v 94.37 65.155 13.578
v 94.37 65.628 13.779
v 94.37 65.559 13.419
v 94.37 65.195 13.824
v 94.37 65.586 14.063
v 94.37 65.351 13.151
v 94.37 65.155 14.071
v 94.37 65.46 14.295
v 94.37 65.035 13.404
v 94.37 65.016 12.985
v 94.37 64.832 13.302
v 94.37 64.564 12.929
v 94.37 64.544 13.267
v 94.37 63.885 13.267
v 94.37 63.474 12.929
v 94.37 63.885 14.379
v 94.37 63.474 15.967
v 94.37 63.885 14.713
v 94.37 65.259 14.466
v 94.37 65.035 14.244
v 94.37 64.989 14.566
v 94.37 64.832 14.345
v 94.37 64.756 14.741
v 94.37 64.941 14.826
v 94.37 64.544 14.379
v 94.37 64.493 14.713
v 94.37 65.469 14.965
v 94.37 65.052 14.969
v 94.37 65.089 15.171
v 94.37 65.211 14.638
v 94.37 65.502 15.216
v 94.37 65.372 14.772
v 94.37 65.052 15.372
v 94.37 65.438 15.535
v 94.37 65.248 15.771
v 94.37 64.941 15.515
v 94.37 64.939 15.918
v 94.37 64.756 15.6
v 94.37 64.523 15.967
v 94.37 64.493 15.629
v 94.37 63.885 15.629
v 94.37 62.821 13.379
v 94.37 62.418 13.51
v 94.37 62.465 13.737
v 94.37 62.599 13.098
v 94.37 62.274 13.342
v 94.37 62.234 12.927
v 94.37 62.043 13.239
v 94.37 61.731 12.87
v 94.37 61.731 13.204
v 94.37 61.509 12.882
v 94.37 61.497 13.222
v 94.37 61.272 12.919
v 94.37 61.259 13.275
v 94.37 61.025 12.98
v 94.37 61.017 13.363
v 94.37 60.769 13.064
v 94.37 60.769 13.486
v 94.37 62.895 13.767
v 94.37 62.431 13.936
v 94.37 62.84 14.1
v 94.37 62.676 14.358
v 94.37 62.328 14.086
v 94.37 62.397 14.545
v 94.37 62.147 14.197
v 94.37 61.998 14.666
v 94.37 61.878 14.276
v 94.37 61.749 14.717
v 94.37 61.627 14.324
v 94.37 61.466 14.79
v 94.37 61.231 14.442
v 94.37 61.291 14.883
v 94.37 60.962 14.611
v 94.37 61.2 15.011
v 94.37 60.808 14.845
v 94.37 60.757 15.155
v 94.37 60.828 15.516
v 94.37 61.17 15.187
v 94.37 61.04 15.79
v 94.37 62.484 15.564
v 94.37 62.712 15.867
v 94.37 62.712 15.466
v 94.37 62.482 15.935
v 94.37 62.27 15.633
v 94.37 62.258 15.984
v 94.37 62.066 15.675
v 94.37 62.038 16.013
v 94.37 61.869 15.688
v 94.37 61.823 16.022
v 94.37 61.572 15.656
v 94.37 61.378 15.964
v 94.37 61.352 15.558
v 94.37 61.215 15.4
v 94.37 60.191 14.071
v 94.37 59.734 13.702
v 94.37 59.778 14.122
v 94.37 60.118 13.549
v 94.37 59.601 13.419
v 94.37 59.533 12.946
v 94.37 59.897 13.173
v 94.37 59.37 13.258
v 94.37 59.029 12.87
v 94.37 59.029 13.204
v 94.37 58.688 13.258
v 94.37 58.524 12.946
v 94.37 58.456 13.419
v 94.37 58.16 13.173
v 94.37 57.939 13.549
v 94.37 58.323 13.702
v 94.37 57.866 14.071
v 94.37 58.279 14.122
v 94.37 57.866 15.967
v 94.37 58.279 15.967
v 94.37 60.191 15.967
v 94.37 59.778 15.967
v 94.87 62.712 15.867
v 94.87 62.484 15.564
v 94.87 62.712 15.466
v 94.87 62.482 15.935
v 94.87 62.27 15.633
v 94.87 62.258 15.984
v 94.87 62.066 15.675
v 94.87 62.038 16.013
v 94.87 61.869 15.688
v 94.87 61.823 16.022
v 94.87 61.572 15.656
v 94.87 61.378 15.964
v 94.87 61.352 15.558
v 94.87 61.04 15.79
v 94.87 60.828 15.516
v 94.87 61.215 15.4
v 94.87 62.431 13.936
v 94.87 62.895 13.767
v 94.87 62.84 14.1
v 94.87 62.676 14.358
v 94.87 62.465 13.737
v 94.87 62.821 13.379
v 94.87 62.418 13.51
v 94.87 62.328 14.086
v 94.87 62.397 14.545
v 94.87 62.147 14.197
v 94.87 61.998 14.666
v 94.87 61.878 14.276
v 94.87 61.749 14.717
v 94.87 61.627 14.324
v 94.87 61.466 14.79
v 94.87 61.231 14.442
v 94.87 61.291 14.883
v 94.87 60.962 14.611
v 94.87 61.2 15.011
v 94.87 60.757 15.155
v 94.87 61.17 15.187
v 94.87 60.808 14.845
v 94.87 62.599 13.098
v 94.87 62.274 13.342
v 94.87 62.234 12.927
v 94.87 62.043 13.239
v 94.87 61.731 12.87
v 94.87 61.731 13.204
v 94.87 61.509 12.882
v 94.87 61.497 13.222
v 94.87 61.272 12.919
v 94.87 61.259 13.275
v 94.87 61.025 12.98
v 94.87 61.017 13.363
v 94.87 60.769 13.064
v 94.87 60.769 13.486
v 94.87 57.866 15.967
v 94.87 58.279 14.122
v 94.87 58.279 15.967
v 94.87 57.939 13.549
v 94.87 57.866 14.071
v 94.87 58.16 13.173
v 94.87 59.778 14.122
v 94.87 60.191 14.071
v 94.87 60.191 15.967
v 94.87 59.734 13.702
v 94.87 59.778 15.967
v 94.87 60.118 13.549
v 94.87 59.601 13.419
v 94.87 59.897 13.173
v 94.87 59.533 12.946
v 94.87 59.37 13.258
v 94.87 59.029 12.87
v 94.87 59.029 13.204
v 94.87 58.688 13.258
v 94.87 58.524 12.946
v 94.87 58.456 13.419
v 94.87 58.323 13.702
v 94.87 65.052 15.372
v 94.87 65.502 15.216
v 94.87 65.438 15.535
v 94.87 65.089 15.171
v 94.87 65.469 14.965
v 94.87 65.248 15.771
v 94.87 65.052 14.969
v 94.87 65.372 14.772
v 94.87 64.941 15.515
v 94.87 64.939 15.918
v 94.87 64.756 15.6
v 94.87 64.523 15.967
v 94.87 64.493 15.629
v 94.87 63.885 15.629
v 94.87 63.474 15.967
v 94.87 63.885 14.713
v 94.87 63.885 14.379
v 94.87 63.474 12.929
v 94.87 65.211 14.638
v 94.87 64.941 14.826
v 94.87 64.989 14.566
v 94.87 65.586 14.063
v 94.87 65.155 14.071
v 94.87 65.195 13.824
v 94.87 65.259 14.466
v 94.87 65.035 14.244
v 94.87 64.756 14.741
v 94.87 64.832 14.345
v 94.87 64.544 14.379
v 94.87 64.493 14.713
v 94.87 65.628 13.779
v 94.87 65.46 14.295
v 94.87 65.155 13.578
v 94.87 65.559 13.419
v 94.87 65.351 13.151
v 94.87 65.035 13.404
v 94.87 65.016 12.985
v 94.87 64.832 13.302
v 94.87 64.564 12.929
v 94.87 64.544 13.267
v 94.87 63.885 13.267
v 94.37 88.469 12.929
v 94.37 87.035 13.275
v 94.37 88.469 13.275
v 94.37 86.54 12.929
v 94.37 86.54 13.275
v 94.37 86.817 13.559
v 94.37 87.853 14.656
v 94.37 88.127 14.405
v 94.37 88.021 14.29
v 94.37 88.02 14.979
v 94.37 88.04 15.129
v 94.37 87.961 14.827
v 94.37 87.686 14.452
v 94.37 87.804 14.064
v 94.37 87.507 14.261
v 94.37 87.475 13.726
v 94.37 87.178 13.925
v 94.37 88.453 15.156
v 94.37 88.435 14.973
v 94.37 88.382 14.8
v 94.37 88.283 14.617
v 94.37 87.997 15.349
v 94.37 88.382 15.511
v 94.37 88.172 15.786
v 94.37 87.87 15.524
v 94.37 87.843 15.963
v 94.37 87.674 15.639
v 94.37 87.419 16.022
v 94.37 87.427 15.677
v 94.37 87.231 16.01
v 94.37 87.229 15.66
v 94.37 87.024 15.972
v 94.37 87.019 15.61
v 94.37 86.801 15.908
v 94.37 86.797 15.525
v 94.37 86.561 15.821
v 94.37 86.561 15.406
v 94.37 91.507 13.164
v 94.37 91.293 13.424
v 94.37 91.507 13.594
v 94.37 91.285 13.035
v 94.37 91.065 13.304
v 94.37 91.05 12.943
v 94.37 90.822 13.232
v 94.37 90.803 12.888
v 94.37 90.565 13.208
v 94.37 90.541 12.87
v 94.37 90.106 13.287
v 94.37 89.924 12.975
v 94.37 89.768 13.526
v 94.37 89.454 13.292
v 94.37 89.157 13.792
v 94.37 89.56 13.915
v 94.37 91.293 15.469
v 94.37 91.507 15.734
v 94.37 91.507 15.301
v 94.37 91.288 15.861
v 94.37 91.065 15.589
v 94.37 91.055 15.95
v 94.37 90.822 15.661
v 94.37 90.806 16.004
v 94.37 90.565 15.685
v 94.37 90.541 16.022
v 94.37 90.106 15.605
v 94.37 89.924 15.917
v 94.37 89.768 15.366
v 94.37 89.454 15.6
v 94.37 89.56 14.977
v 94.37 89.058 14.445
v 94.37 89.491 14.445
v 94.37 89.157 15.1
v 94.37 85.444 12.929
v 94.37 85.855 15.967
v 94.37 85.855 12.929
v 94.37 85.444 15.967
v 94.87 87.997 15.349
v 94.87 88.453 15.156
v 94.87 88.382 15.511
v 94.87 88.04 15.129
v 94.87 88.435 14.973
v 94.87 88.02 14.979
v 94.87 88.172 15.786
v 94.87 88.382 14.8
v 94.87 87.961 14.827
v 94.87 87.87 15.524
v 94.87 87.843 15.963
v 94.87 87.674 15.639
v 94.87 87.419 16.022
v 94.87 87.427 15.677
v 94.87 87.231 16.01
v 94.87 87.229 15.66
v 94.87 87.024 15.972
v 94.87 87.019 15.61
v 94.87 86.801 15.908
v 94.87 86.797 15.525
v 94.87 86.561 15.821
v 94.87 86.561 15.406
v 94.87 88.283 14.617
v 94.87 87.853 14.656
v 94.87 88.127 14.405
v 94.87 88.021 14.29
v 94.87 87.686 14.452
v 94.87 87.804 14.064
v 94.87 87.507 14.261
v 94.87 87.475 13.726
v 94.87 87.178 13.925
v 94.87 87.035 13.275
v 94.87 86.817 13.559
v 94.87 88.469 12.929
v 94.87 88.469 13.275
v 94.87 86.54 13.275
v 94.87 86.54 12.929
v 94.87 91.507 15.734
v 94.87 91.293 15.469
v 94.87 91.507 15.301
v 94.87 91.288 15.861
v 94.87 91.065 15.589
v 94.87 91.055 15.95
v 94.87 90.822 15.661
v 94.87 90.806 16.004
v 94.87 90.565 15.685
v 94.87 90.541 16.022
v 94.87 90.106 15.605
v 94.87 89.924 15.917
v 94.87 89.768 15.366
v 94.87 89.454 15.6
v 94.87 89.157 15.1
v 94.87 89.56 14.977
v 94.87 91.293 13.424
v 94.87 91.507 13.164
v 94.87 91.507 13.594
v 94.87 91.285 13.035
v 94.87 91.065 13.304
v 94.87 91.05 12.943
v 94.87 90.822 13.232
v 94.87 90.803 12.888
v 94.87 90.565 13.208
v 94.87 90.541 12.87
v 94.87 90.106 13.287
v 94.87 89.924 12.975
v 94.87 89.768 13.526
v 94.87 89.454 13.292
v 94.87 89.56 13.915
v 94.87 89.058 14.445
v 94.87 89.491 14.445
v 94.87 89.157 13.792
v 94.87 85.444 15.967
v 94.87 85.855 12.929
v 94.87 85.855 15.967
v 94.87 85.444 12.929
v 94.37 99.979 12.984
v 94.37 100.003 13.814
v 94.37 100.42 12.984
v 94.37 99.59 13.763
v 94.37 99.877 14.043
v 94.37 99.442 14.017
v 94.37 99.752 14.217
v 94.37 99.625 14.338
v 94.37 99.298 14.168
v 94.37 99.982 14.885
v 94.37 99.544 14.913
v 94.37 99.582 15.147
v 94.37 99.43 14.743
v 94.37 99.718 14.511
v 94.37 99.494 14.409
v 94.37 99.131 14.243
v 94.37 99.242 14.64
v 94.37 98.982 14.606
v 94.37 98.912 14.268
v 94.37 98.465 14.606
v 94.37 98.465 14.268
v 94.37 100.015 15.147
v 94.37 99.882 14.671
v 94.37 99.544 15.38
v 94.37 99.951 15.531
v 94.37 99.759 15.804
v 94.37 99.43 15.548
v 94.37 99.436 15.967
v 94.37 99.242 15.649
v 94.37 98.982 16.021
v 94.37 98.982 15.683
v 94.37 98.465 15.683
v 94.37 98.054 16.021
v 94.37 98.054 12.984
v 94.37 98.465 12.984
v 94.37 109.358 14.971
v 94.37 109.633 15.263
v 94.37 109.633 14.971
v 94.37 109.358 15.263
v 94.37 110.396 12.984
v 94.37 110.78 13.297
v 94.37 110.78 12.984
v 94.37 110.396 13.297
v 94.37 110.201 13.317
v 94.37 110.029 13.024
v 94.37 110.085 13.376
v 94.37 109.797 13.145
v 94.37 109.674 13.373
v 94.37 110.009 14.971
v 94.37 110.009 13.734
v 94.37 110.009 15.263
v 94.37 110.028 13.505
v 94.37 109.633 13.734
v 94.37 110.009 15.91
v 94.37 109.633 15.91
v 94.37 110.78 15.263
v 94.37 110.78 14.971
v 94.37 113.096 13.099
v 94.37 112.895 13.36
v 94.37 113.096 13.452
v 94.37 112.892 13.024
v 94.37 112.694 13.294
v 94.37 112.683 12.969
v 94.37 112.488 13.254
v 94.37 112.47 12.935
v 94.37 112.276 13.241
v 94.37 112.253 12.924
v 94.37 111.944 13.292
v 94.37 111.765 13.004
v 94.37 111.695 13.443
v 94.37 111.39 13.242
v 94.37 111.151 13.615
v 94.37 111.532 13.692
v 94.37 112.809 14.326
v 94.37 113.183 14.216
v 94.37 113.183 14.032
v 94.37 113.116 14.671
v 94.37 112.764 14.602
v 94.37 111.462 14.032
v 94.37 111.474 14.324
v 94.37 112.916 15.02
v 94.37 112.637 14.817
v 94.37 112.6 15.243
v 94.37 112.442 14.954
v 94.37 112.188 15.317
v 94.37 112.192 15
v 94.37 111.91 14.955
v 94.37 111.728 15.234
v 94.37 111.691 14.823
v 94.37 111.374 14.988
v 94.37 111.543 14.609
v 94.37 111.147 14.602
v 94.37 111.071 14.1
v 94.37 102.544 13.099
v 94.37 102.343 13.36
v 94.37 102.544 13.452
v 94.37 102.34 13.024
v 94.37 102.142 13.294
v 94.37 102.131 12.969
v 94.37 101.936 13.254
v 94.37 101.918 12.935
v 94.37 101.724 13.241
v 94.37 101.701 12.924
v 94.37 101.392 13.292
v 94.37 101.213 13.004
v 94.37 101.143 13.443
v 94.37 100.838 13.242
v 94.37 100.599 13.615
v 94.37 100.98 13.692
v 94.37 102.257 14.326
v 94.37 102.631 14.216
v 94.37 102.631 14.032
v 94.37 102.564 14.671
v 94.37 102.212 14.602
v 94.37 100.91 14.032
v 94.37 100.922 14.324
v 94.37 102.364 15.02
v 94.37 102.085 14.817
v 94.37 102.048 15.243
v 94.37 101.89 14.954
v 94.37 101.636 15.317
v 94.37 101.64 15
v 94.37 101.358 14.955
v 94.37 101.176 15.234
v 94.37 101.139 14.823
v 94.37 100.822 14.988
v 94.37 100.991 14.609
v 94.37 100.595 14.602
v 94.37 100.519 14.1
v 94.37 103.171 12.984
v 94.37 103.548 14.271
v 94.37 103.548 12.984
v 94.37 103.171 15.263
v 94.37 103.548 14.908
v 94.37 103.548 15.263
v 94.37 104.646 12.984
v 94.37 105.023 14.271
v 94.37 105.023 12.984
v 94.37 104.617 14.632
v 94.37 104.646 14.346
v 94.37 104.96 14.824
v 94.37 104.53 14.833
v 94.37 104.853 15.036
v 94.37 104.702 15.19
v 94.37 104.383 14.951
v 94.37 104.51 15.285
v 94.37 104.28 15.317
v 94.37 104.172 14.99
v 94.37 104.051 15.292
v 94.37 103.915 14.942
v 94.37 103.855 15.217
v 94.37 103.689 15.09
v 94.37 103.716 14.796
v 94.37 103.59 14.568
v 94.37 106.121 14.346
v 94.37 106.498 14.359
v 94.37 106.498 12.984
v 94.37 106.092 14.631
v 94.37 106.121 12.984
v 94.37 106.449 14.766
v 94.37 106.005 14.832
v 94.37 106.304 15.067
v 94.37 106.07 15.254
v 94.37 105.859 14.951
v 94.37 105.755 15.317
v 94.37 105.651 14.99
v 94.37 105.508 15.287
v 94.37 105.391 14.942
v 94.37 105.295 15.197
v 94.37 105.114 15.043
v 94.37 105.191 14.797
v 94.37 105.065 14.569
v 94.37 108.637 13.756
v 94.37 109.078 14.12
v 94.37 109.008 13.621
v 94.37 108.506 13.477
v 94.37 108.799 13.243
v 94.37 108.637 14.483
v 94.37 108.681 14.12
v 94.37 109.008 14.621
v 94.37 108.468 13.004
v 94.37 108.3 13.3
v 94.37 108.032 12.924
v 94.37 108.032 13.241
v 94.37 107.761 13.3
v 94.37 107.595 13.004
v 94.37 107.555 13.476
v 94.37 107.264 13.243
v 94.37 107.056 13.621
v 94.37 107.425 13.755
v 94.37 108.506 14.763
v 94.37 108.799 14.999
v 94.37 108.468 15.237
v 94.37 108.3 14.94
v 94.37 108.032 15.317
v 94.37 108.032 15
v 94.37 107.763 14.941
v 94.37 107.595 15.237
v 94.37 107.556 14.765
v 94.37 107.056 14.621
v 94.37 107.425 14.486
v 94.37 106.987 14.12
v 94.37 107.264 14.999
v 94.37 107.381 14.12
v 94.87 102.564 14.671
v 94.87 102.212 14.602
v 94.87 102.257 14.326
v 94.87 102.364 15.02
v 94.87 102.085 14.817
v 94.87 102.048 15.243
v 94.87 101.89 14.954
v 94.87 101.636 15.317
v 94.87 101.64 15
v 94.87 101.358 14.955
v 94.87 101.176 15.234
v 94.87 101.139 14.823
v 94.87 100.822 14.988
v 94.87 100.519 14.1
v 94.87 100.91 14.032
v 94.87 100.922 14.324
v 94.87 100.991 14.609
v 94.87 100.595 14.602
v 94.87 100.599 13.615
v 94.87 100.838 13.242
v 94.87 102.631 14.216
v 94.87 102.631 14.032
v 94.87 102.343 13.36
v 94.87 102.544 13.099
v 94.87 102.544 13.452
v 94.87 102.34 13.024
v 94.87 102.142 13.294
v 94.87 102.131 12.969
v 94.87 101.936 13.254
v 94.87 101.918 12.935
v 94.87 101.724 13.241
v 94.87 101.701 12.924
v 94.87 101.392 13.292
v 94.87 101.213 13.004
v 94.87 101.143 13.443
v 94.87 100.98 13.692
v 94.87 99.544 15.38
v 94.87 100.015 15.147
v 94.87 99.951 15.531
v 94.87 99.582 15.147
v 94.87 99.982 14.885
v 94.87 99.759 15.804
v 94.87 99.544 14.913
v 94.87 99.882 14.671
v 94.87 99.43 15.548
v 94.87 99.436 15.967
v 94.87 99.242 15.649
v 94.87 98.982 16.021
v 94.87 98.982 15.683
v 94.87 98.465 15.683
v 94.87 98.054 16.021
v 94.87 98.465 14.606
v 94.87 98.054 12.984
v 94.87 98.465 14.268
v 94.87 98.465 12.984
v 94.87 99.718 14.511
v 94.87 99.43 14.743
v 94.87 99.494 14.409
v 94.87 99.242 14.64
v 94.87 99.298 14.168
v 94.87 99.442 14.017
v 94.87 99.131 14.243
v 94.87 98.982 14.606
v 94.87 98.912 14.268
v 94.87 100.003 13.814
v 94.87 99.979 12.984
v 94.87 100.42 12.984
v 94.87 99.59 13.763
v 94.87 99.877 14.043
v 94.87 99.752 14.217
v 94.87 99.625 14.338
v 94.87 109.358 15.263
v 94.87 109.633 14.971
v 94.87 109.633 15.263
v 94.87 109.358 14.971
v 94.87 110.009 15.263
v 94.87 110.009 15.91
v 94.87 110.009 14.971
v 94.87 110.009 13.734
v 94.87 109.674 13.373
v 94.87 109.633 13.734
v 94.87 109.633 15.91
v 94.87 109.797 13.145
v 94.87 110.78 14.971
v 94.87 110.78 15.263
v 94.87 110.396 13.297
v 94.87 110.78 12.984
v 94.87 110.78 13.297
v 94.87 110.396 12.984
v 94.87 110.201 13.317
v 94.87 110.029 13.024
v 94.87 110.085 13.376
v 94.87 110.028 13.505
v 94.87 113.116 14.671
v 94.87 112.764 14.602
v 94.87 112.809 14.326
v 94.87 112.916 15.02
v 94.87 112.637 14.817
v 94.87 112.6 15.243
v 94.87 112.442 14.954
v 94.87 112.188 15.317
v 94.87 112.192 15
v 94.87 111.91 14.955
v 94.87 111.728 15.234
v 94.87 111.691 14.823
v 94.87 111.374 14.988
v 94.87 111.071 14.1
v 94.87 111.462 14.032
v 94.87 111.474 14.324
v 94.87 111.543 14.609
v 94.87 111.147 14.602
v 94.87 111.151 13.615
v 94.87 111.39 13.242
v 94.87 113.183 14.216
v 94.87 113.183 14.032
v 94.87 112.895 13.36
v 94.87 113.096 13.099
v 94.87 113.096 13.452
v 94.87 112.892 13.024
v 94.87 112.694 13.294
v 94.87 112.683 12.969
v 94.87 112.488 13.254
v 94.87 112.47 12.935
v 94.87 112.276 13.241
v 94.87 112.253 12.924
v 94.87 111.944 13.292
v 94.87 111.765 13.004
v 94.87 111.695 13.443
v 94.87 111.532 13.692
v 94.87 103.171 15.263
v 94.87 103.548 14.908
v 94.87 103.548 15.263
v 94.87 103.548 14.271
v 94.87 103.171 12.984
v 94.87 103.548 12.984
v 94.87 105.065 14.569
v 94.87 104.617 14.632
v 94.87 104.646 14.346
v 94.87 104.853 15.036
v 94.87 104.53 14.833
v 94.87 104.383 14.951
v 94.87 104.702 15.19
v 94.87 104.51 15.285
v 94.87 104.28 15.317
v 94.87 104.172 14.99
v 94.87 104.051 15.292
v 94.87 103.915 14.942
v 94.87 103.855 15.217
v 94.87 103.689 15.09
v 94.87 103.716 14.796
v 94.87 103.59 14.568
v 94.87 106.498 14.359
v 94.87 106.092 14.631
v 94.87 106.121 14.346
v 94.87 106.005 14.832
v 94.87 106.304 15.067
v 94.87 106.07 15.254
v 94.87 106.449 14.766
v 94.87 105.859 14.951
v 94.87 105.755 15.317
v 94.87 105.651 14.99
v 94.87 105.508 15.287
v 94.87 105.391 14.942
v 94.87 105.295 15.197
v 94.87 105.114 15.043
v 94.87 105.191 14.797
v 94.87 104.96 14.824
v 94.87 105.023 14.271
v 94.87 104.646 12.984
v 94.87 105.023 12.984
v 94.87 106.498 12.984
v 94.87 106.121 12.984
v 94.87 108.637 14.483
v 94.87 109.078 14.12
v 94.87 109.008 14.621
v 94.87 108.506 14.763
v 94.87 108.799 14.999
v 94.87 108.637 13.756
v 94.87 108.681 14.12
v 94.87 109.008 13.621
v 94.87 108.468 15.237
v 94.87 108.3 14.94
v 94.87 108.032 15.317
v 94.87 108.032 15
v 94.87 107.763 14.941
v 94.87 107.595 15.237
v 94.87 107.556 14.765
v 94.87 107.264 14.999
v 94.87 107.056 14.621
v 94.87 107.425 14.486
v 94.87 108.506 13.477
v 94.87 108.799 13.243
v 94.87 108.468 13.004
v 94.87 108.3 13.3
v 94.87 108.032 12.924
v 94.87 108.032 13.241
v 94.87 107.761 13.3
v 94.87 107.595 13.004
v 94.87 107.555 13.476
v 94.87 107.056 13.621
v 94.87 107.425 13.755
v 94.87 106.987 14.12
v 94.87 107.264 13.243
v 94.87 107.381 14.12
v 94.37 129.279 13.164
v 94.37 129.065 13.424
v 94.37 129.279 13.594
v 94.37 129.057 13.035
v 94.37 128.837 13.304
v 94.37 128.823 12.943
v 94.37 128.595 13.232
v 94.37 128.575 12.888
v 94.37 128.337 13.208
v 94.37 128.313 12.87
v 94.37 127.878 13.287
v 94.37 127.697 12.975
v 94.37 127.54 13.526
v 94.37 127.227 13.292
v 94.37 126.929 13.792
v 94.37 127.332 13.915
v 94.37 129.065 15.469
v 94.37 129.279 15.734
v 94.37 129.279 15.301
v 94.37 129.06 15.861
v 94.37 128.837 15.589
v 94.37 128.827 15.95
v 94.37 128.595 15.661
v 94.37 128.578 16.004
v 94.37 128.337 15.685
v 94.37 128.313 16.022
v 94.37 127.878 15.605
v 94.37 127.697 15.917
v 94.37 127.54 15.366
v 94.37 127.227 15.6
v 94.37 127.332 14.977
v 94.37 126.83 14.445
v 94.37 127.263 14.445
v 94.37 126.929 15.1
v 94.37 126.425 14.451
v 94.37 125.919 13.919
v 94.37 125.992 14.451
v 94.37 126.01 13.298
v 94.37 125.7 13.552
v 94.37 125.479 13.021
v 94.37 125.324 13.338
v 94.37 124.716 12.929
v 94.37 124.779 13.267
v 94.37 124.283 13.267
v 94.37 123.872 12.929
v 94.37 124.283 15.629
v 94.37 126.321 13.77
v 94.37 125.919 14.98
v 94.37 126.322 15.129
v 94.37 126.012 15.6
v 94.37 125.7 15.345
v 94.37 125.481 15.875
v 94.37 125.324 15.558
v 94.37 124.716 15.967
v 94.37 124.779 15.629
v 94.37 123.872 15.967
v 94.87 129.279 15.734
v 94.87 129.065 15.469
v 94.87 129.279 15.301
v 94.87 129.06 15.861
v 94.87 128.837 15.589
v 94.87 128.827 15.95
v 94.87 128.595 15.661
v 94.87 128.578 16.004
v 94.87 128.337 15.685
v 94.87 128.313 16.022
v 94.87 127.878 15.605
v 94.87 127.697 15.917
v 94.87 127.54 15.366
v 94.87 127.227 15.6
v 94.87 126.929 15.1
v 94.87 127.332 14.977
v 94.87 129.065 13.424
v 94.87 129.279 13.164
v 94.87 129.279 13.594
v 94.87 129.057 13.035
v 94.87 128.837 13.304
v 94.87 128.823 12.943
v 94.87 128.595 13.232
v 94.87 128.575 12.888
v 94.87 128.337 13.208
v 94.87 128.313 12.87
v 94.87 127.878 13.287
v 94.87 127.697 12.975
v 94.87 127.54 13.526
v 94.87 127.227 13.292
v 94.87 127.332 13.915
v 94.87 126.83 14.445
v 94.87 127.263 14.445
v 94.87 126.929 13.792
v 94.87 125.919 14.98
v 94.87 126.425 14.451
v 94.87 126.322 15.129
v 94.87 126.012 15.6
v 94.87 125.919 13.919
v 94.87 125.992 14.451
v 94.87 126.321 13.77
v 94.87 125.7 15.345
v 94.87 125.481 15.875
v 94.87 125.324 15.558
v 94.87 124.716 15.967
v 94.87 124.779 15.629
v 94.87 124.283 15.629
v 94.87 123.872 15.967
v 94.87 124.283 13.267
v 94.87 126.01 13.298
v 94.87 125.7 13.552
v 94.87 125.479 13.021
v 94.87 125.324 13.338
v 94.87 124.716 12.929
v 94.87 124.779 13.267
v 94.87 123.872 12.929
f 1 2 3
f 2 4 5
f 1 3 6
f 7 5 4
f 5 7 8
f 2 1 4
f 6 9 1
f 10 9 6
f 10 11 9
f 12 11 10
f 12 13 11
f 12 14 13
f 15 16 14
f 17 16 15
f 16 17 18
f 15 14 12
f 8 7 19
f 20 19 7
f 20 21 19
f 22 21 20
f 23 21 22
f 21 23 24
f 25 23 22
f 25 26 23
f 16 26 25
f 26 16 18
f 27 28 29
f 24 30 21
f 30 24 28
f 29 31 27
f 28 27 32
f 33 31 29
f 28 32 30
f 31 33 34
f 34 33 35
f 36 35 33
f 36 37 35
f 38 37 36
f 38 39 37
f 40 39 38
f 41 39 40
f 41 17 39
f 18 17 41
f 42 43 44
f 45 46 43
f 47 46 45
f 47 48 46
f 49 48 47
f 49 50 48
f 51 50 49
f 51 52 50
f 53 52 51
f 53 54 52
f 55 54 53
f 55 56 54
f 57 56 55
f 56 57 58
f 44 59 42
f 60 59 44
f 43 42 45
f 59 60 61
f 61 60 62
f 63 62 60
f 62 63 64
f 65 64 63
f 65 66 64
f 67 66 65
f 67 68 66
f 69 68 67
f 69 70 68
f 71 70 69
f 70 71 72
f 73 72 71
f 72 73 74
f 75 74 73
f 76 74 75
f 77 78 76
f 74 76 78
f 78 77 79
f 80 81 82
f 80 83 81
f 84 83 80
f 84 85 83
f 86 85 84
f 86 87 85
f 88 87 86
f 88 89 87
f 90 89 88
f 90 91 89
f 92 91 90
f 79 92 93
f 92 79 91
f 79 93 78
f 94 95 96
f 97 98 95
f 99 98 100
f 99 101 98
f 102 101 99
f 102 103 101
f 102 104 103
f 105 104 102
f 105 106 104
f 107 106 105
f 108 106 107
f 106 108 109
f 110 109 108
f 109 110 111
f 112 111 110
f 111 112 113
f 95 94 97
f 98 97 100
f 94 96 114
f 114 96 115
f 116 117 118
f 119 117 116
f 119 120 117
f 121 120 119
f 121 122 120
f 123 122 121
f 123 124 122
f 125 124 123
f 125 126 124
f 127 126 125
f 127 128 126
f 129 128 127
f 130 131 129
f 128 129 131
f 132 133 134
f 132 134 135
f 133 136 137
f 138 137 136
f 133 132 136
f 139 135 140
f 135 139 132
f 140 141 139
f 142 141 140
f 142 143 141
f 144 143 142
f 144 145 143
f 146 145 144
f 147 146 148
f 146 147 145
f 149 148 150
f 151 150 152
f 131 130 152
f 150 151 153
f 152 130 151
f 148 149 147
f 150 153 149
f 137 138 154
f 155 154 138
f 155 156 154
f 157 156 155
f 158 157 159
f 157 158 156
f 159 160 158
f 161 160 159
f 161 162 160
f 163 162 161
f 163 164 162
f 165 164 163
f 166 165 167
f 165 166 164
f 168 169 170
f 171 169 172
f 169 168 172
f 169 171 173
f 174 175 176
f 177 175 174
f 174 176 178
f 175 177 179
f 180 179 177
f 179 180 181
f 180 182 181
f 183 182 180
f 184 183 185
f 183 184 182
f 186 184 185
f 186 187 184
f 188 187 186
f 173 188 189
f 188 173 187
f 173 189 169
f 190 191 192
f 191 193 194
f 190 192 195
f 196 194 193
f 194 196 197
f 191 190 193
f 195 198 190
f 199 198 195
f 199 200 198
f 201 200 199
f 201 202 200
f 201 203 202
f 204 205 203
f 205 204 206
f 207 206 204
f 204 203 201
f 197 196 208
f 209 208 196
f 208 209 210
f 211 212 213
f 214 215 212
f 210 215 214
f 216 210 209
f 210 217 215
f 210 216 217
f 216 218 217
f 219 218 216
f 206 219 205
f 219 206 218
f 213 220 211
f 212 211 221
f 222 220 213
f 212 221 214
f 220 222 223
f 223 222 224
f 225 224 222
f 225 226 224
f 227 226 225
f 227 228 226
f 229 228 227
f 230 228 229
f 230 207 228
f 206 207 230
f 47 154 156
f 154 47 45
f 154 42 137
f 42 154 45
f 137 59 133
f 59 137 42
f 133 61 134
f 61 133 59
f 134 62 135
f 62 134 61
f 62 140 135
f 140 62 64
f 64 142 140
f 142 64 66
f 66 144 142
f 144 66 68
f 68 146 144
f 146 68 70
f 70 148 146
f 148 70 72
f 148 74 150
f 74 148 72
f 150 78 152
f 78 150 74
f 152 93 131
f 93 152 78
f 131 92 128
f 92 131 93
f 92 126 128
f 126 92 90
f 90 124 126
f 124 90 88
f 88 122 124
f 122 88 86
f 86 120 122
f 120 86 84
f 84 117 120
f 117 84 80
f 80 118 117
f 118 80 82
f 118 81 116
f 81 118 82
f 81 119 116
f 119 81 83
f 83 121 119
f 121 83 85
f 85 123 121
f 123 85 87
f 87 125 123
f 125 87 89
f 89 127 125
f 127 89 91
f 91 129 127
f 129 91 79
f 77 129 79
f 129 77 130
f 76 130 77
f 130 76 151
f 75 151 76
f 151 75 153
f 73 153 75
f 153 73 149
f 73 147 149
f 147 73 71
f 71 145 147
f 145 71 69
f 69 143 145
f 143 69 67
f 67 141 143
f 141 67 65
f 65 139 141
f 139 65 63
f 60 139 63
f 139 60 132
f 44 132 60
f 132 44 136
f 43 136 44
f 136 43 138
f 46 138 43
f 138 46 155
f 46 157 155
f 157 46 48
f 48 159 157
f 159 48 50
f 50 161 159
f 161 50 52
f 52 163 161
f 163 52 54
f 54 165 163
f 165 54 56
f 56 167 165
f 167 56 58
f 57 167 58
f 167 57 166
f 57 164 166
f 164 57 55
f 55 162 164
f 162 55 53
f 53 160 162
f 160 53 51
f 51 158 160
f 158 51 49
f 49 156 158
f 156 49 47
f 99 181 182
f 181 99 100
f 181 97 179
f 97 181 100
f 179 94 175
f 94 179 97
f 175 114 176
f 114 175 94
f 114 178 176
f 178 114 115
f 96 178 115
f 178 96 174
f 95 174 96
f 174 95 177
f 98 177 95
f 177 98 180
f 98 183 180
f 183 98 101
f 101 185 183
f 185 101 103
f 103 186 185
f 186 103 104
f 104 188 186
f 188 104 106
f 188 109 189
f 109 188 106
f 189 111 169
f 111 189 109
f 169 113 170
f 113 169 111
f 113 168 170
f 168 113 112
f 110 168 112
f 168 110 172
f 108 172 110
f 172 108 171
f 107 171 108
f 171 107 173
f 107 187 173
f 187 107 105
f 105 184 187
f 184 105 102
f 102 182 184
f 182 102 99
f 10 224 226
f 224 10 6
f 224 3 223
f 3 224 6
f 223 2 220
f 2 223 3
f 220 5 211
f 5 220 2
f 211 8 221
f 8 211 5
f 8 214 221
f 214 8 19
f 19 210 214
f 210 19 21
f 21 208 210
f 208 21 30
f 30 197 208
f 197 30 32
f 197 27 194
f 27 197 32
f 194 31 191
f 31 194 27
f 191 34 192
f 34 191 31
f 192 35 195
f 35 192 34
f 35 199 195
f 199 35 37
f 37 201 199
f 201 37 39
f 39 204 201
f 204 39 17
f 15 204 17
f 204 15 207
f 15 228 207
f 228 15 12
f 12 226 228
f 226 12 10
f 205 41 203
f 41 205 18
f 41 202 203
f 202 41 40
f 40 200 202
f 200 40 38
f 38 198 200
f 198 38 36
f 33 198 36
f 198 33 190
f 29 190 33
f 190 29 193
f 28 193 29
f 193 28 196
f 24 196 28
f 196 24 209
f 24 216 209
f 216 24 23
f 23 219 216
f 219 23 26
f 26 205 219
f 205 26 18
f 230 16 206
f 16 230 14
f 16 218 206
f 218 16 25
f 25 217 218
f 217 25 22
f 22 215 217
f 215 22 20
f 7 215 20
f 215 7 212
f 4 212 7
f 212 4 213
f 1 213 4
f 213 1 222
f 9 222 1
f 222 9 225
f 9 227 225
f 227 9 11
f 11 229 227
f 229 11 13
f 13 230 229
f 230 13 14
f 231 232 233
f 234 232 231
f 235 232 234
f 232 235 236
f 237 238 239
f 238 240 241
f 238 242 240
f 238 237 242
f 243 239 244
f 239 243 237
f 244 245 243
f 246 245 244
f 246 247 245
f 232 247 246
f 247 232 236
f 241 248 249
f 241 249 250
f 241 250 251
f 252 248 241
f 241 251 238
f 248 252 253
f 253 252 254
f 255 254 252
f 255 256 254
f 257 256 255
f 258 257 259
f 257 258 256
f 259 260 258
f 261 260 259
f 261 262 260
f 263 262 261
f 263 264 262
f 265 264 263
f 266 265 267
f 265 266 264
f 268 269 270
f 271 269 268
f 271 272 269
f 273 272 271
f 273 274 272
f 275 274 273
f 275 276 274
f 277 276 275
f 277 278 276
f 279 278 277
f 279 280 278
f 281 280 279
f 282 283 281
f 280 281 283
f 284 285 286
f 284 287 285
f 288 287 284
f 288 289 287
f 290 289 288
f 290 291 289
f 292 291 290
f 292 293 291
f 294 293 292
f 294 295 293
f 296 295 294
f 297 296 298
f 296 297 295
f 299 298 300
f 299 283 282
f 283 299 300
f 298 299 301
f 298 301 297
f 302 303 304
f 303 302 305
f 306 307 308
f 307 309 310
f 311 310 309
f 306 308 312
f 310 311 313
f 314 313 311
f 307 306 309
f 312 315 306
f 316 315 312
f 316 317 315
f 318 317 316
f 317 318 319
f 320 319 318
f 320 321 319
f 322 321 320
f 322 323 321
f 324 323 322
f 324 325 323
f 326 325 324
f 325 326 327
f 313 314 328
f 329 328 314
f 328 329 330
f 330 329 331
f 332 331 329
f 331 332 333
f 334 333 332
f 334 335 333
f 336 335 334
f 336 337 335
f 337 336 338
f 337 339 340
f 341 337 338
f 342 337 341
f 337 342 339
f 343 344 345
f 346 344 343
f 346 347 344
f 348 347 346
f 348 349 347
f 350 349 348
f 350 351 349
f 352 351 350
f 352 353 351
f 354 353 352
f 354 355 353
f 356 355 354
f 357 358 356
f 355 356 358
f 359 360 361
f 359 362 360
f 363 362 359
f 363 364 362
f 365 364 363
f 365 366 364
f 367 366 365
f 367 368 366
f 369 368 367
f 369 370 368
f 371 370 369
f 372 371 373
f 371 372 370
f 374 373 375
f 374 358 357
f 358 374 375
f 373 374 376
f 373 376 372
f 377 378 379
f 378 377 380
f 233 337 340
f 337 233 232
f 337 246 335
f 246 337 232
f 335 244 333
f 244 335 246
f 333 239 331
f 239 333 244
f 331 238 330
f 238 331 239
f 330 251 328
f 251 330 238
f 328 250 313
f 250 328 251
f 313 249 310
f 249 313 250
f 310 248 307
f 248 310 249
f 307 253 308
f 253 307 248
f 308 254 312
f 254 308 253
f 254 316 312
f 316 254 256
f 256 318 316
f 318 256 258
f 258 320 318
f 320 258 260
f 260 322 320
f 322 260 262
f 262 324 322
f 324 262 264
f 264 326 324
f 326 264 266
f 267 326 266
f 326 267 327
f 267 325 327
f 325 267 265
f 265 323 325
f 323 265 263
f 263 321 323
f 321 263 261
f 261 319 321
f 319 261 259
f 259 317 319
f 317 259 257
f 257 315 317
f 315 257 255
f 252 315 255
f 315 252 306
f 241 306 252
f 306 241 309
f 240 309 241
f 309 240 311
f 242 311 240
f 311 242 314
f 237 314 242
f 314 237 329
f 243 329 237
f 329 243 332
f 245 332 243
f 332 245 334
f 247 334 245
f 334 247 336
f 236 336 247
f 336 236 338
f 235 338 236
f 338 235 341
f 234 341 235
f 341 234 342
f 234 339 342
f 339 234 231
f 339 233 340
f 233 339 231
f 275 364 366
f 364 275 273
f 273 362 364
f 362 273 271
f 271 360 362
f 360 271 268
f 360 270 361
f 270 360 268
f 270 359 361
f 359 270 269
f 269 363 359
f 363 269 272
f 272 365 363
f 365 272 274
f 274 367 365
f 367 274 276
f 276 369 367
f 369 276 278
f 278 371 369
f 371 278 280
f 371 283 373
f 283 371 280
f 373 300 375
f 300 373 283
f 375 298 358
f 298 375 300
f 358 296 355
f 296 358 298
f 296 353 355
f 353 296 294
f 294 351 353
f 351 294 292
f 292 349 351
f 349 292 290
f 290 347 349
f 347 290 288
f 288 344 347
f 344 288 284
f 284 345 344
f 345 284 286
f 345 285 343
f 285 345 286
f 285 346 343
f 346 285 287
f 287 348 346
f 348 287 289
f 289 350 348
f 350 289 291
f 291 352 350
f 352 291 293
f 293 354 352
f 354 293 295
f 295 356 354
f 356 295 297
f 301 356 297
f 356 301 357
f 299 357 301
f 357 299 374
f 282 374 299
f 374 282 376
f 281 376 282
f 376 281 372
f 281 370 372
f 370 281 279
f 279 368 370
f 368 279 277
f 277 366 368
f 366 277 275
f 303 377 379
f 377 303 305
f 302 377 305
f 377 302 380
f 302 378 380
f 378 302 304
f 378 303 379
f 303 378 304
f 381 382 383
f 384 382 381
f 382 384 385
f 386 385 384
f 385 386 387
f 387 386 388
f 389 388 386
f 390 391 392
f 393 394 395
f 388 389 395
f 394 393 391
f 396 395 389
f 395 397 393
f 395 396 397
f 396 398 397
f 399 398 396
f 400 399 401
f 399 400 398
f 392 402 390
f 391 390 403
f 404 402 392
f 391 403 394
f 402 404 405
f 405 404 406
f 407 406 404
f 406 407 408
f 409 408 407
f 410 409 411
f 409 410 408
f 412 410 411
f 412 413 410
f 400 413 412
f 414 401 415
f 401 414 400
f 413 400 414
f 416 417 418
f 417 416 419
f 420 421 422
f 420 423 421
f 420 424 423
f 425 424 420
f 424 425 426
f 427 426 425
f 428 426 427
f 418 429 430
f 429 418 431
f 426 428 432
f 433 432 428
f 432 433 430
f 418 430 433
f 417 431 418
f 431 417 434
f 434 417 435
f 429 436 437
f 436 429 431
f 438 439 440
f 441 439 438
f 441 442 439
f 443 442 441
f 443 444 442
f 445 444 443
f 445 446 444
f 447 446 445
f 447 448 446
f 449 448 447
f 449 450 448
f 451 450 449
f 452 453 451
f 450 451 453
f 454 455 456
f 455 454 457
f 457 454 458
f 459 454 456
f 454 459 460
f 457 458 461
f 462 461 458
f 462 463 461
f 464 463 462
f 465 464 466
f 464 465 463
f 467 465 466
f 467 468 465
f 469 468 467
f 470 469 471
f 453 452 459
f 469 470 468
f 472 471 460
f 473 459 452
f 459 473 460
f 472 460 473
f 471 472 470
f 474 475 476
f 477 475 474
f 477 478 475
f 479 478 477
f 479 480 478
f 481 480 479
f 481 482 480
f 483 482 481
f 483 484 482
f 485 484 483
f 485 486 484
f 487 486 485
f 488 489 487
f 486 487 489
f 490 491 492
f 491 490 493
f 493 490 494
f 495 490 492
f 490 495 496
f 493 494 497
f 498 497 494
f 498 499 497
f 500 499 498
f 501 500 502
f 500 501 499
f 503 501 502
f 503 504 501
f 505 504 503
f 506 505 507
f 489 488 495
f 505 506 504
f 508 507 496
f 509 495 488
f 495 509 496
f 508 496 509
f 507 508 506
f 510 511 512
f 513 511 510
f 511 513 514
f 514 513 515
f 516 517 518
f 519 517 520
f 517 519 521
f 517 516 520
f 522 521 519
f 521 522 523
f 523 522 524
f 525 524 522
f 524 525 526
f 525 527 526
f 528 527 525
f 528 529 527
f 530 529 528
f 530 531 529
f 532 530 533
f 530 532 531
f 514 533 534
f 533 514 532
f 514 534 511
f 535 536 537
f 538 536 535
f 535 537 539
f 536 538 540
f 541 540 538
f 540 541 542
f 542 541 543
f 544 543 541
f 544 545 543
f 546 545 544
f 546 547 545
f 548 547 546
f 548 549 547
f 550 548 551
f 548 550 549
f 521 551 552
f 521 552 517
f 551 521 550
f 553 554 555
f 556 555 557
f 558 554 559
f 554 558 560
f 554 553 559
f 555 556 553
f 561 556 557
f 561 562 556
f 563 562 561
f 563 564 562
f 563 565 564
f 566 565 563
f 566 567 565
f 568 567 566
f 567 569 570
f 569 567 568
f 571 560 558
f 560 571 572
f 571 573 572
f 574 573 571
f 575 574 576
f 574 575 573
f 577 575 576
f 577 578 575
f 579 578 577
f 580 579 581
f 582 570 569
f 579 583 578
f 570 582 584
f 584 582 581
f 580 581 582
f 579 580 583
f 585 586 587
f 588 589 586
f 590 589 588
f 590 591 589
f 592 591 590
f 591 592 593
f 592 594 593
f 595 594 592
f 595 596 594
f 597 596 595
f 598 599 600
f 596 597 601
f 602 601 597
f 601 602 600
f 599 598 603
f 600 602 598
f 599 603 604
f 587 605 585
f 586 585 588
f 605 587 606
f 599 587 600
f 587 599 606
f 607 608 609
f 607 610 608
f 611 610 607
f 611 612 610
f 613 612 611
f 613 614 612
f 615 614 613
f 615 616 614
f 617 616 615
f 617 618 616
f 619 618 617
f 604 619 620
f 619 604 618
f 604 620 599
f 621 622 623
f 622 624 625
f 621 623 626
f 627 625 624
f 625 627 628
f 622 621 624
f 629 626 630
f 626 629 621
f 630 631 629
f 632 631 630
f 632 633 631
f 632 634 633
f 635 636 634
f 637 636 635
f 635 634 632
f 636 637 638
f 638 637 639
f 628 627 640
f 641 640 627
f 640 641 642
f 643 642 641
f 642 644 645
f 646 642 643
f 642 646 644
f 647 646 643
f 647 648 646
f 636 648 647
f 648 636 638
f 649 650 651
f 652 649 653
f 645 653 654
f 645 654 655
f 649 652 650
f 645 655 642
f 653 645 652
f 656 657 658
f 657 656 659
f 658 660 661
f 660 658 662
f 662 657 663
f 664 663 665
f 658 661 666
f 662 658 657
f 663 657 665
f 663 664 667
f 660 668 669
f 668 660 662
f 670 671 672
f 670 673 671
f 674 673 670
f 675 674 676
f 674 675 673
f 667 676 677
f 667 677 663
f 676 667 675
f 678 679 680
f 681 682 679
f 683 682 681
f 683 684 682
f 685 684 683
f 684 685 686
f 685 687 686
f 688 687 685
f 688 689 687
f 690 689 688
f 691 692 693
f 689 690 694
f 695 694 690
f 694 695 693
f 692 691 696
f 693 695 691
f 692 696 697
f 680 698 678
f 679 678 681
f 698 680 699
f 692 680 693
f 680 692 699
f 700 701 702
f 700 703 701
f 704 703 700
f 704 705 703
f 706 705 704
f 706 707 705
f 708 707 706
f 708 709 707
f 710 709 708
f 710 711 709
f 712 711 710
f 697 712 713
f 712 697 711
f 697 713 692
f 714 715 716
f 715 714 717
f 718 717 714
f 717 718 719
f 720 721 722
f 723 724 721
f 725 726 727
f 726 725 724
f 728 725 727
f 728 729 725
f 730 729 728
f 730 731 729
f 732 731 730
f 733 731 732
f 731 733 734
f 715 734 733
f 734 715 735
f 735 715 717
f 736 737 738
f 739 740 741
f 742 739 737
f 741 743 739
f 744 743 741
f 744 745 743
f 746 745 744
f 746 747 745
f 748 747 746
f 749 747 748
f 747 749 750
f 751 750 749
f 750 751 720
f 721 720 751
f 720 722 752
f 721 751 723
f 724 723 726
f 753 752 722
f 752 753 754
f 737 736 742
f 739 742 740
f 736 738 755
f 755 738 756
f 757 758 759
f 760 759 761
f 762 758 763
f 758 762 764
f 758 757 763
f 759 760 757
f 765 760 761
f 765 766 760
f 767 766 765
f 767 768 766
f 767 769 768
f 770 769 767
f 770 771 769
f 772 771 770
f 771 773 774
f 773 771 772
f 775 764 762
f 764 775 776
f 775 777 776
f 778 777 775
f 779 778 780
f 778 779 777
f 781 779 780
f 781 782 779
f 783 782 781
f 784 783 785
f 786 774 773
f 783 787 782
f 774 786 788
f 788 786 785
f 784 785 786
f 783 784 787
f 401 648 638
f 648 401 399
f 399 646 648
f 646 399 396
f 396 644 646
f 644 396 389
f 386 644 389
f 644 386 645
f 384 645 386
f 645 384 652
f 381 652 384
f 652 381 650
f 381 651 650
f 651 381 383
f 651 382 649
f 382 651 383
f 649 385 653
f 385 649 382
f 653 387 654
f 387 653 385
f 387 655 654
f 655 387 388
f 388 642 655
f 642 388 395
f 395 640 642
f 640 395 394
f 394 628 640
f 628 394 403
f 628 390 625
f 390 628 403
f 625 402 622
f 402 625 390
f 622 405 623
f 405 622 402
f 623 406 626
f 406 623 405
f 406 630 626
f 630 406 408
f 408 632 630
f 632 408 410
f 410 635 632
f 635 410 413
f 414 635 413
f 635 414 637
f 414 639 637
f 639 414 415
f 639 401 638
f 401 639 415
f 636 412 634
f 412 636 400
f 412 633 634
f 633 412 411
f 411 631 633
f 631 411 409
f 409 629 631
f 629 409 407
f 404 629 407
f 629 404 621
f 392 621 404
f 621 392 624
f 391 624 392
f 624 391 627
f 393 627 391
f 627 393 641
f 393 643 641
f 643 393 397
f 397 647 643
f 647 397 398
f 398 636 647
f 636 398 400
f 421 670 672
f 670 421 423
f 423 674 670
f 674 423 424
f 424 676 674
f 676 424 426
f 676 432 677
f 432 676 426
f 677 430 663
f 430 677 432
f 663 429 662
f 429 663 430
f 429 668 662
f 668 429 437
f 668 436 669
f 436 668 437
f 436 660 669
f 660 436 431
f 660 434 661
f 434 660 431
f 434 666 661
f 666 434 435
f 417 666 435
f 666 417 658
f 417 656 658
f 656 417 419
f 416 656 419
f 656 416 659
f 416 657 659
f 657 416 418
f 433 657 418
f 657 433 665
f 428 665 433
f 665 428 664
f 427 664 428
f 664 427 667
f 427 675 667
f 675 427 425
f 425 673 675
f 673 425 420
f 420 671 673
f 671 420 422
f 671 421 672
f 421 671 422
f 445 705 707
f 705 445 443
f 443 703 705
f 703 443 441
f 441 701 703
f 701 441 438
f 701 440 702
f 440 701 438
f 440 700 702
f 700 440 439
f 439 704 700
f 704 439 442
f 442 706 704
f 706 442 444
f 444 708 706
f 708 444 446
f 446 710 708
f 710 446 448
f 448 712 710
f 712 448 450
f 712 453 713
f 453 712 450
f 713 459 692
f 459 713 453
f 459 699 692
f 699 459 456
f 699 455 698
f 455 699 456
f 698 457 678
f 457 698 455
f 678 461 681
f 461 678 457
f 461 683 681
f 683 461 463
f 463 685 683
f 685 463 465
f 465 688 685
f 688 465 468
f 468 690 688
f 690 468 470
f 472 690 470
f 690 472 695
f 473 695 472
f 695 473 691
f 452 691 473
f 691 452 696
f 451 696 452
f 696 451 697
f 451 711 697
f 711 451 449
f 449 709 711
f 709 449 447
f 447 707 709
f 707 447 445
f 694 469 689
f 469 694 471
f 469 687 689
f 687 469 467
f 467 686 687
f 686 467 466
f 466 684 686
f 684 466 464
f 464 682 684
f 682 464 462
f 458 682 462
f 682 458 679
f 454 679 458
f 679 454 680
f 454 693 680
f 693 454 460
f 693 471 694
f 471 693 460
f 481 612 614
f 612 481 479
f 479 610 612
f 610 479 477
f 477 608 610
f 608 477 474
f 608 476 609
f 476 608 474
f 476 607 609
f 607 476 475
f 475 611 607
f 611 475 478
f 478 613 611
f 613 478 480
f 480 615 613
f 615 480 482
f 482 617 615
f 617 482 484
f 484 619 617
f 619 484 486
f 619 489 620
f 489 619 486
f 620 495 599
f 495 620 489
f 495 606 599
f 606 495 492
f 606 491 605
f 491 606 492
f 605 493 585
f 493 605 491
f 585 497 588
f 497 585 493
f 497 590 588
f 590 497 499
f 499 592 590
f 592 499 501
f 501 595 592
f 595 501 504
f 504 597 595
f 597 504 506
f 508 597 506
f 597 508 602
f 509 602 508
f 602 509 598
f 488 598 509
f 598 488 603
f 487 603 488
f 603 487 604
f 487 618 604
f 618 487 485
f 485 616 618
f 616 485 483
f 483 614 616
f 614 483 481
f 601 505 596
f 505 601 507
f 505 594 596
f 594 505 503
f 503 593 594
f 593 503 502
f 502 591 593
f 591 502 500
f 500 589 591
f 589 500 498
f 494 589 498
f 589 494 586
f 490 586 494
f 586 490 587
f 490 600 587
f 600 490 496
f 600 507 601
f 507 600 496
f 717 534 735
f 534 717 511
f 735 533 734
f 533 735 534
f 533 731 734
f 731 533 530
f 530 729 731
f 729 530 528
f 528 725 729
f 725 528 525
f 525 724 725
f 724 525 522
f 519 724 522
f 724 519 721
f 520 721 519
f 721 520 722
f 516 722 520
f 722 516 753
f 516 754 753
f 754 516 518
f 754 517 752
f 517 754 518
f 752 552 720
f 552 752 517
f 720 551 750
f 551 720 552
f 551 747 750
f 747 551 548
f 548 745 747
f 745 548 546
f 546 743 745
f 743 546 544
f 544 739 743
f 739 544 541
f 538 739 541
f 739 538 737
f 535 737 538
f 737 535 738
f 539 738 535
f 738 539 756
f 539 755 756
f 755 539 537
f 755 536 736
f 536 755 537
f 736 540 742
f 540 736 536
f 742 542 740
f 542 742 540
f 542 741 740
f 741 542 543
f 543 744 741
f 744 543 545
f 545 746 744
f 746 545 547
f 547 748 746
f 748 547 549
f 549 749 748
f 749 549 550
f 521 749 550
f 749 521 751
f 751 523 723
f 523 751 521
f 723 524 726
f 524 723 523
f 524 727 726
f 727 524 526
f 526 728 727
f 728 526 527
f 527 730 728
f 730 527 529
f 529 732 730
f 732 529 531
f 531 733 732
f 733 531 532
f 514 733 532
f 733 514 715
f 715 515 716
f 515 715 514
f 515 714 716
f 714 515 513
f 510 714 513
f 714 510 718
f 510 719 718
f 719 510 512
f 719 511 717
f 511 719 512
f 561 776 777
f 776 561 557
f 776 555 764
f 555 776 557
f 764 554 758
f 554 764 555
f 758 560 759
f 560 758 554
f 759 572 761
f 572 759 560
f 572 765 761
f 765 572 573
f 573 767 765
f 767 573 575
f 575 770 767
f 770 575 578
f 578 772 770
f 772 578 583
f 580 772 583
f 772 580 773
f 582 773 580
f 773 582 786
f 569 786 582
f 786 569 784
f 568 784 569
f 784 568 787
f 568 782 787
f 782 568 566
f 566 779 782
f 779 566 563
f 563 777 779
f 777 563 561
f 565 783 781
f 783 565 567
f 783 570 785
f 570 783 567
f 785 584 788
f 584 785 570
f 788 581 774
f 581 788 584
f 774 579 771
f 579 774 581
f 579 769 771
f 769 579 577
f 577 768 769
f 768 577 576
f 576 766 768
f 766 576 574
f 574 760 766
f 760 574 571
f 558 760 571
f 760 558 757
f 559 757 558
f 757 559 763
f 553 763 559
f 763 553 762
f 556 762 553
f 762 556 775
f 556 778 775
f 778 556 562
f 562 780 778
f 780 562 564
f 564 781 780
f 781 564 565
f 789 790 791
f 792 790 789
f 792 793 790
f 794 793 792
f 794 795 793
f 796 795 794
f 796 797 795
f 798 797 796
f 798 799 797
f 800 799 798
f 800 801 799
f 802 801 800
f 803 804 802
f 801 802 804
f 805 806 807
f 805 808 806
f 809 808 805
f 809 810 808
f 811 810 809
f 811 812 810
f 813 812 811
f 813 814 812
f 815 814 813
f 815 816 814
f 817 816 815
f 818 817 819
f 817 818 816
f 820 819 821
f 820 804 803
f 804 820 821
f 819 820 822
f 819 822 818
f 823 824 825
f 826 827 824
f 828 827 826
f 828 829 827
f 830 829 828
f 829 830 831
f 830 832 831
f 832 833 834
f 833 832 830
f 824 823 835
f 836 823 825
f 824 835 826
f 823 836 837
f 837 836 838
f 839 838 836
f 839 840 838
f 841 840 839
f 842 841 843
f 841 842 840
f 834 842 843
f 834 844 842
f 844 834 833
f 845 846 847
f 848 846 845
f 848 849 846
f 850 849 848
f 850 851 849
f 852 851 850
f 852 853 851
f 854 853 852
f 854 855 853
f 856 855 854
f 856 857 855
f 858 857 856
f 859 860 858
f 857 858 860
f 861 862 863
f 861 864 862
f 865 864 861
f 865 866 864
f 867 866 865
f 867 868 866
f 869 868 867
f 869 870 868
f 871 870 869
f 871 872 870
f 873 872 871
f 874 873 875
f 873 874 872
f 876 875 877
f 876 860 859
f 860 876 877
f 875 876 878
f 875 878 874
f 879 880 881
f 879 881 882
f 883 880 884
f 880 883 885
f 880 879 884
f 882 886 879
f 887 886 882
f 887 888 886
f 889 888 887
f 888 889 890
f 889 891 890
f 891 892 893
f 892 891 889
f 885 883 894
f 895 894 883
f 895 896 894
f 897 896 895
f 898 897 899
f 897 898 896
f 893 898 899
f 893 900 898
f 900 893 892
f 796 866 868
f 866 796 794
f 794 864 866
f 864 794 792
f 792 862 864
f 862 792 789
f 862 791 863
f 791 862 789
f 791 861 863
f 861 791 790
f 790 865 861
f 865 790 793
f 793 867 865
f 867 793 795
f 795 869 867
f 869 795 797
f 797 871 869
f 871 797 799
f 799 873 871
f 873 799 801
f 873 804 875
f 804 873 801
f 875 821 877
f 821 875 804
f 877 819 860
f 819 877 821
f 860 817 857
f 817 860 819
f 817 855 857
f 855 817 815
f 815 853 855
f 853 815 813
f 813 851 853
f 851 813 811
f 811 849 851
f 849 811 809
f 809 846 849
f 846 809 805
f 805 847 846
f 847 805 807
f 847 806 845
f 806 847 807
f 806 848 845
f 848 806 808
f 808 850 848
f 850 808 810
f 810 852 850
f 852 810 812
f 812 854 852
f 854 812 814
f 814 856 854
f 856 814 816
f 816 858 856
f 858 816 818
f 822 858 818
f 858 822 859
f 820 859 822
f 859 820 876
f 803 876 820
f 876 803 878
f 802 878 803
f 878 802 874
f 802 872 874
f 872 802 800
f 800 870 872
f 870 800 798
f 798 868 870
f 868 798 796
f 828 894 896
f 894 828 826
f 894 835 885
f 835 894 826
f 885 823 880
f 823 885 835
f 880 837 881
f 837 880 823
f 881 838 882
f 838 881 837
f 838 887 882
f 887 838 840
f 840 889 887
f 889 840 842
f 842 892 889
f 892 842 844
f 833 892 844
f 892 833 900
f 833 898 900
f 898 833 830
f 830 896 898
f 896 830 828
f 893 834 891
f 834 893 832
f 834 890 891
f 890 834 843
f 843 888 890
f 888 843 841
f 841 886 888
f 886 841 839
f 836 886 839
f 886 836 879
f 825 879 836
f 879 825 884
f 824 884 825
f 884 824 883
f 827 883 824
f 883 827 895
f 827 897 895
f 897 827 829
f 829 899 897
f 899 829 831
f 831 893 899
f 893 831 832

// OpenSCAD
/* [Box dimensions] */
// - Longueur - Length  
  Length        = 83.82+13;       
// - Largeur - Width
  //Width         = 138+13;   
  Width         = 138+13;                     
// - Hauteur - Height  
  Height        = 40;  
// - Epaisseur - Wall thickness  
  Thick         = 2;//[2:5]  
  
/* [Box options] */
// - Diamètre Coin arrondi - Filet diameter  
  Filet         = 2;//[0.1:12] 
// - lissage de l'arrondi - Filet smoothness  
  Resolution    = 50;//[1:100] 
// - Tolérance - Tolerance (Panel/rails gap)
  m             = 0.9;
// Pieds PCB - PCB feet (x4) 
  PCBFeet       = 1;// [0:No, 1:Yes]
// - Decorations to ventilation holes
  Vent          = 1;// [0:No, 1:Yes]
// - Decoration-Holes width (in mm)
  Vent_width    = 1.5;   


  
/* [PCB_Feet] */
//All dimensions are from the center foot axis

// - Coin bas gauche - Low left corner X position
PCBPosX         = 0;
// - Coin bas gauche - Low left corner Y position
PCBPosY         = 0;
// - Longueur PCB - PCB Length
PCBLength       = 83.82;
// - Largeur PCB - PCB Width
PCBWidth        = 137.16;
// - Heuteur pied - Feet height
PCBThick        = 1.6;
// - Heuteur pied - Feet height
FootHeight      = 15;
// - Diamètre pied - Foot diameter
FootDia         = 7;
// - Diamètre trou - Hole diameter
FootHole        = 3.0;  
// - Coin bas gauche - Low left corner X position
FootPosX         = 5.08;
// - Coin bas gauche - Low left corner Y position
FootPosY         = 5.08;

/* [STL element to export] */
//Coque haut - Top shell
GPAD_TShell          = 0;// [0:No, 1:Yes]
//Coque bas- Bottom shell
GPAD_BShell          = 0;// [0:No, 1:Yes]
//Panneau avant - Front panel
GPAD_FPanL           = 1;// [0:No, 1:Yes]
//Panneau arrière - Back panel  
GPAD_BPanL           = 0;// [0:No, 1:Yes]
//Buttons
BButton         = 0;
//T and BShellScrew
T_BShellScrew   = 1;
BOSSScrew = 0;
//show pcb
PCB_View        = 0;
LED_Standoff    = 0;
LED_Standoff_Single    = 1; 
/* [Hidden] */
// - Couleur coque - Shell color  
Couleur1        = "Orange";       
// - Couleur panneaux - Panels color    
Couleur2        = "OrangeRed";    
// Thick X 2 - making decorations thicker if it is a vent to make sure they go through shell
Dec_Thick       = Vent ? Thick*2 : Thick; 
// - Depth decoration
Dec_size        = Vent ? Thick*2 : 0.8;

// Krake Modifications for SpeakerHole
SpeakerHoleY = 15.24;
SpeakerHoleX = PCBLength-15.24;

//Krake Modifications for Display
 DisplayXpos = PCBLength-50.8;
 DisplayYpos = 71.12;
 DisplayLenght = 26;
 DisplayWidth = 76;
 DisplayFilet = 0;
 
 //Krake Modificationd for muteButton
 muteButtonXpos = PCBLength-10;
 muteButtonYpos = 31.75;
 muteButtonDiameter = 15;
 //For instructions on mute Button inscription go to line 594.
 
//                           <- Panel ->  
module Panel(Length,Width,Thick,Filet){
    scale([0.5,1,1])
    %minkowski(){
            cube([Thick,Width-(Thick*2+Filet*2+m),Height-(Thick*2+Filet*2+m)]);
            translate([0,Filet,Filet])
            rotate([0,90,0])
            cylinder(r=Filet,h=Thick, $fn=100);
      }
}

//                      <- Linear text panel -> 
module LText(OnOff,Tx,Ty,Font,Size,Content,_valign="baseline",_halign="left"){

    if(OnOff==1)
    translate([Tx,Ty,Thick+.5])
    linear_extrude(height = 0.5){
    text(Content, size=Size, font=Font, halign = _halign,valign=_valign);
    }
}

//                          <- Square hole ->  
// Sx=Square X position | Sy=Square Y position | Sl= Square Length | Sw=Square Width | Filet = Round corner
module SquareHole(OnOff,Sx,Sy,Sl,Sw,Filet,Ccenter=false){
    if(OnOff==1)
     minkowski(){
        translate([Sx+Filet/2,Sy+Filet/2,-1])
            cube([Sl-Filet,Sw-Filet,10],center=Ccenter);
            cylinder(d=Filet,h=10, $fn=100,center=Ccenter);
       }
}
 
 // Panneau avant - Front panel  <<<<<< Text and holes only on this one.
//rotate([0,-90,-90]) 
if(GPAD_FPanL==1){
        translate([Length-(Thick*2+m/2),Thick+m/2,Thick+m/2])
        FPanL();
}

module FPanL(){
    difference(){
        color(Couleur2)
        Panel(Length,Width,Thick,Filet);
    
 
    rotate([90,0,90]){
        color(Couleur2){
//                     <- Cutting shapes from here ->  
            //(On/Off, Xpos,Ypos,Length,Width,Filet)3*Thick+2,Thick+5
        echo((Width - PCBWidth)/2-3*Thick+1);
            echo(Thick+1.2);
            translate([((Width - PCBWidth)/2),0,0]-[3*Thick+2,0,0]){
        SquareHole  (1,54.61+1.2,FootHeight+PCBThick,9,5,1,Ccenter=false); //USB
        SquareHole  (1,81.28-1.2,FootHeight+PCBThick,14,9,1,Ccenter=false); //I2C
        SquareHole  (1,98.425-1.3,FootHeight+PCBThick,14,13,1,Ccenter=false); //SPI
        SquareHole  (1,119.38+0.8,FootHeight+PCBThick,10,12,1,Ccenter=false); //DC barrel
            }
       

//                            <- To here -> 
           }
       }
}
  color(Couleur1){
        translate ([-.5,0,0])
        rotate([90,0,90])        
        translate([((Width - PCBWidth)/2) ,0,0]+[-2.3,0,0]){
//                      <- Adding text from here ->   
      //(On/Off, Xpos, Ypos, "Font", Size, "Text",_halign = "center",_valign="top")  
        LText(1,54.61,FootHeight*.9,"Arial Black",3,"USB",_halign = "center",_valign="top");
        LText(1, 81.28   ,FootHeight*.9,"Arial Black",3,"I2C",_halign = "center",_valign="top");
        LText(1,98.425,FootHeight*.9,"Arial Black",3,"Remote",_halign = "center",_valign="top");
        LText(1,119.38,FootHeight*.9,"Arial Black",3,"DC",_halign = "center",_valign="top");    
       // SquareHole(1,0,FootHeight*.9,1,1,0,Ccenter=true); //origin
//                            <- To here ->
            }
      }
}
if(GPAD_FPanL==1){
        translate([Length-(Thick*2+m/2),Thick+m/2,Thick+m/2])
        FPanL();
}

module frontPanel(){
    difference() {
        Coque();
    
        SpeakerHole(OnOff = 1, Cx = 30, Cy = 20, Cdia = 20, Ccenter = true);
    }
}
 
